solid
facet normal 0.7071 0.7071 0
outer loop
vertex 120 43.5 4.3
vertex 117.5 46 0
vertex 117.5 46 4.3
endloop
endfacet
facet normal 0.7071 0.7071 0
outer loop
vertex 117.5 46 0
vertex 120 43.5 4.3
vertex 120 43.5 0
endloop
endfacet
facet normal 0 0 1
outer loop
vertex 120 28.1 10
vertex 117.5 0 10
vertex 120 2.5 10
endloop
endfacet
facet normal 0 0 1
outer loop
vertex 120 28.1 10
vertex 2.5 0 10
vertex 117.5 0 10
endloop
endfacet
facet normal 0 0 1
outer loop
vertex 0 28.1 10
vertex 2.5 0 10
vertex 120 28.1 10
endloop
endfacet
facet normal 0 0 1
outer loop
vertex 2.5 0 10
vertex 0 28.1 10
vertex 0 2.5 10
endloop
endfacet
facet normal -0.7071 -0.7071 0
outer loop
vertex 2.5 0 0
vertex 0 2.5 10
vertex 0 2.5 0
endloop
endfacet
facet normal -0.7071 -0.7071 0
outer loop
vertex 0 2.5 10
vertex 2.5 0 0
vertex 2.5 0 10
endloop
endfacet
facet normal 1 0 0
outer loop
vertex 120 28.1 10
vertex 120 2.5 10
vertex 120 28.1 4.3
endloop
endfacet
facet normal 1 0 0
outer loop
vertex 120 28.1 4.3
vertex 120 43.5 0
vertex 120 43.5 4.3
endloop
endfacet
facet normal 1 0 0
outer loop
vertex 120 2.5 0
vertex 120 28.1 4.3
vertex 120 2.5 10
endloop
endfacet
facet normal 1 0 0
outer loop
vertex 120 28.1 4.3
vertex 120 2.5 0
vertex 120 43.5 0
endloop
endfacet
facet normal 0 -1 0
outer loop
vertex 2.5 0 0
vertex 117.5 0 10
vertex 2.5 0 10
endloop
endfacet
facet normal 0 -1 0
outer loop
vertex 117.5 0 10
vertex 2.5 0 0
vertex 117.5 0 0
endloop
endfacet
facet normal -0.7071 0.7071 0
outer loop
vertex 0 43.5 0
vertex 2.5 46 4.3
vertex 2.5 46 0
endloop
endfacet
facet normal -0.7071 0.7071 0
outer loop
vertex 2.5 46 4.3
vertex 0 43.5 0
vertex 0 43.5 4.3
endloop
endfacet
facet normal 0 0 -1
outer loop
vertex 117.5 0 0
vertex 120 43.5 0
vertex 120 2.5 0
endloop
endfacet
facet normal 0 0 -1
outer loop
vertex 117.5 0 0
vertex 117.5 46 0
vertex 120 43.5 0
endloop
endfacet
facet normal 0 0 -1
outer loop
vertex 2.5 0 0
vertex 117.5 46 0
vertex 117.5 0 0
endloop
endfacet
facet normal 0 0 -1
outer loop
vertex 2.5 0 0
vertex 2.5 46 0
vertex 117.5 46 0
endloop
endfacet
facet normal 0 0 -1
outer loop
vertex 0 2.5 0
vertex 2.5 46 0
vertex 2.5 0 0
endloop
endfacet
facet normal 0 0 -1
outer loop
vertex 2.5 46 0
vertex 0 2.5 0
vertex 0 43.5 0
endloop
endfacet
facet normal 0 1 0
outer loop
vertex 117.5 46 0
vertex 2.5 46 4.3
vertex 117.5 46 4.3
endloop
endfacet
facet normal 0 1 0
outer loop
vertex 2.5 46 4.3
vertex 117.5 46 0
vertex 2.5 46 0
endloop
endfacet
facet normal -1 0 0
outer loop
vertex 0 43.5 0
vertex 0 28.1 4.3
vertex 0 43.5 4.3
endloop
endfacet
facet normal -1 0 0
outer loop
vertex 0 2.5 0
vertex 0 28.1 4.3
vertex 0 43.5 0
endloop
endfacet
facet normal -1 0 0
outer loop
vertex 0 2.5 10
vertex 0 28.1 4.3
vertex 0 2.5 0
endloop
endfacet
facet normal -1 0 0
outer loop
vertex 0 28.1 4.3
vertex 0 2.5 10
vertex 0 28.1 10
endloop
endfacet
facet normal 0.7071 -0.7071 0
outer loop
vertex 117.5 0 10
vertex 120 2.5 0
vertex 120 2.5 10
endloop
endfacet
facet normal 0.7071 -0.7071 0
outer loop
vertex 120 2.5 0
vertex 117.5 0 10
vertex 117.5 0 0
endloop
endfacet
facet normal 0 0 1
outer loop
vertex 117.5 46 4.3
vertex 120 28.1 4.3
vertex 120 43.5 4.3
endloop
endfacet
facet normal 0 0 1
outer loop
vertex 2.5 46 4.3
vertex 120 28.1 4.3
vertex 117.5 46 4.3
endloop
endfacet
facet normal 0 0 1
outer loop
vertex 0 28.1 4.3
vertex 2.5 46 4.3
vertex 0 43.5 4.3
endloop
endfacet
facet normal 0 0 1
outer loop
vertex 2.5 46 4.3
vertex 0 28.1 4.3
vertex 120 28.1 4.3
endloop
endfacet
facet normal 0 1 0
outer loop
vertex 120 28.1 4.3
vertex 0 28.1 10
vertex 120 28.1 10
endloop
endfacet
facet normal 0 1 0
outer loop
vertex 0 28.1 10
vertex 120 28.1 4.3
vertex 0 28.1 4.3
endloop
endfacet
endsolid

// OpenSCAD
$fn = 32;

// ----------------------------------------------------------------------
// Stepped bar: sidestep, 120 x 46 x 10/4.3 mm
// ----------------------------------------------------------------------

// --- parameters (mm) ---
bar_l = 120;              // bar length, X
bar_w = 46;               // bar width, Y
plate_t = 10;             // thickness of the thick zone, Z
thin_t = 4.3;             // thickness of the thin zone
corner_c = 2.5;           // corner chamfer of the bar
step_cut = 5.7;           // material removed from the thin zone
ledge_y = 28.1;           // start of the ledge from the front edge
depth_1 = 5.7;            // depth of cut 1 from the top face
fit_tol = 0.1;            // declared fit tolerance (prompt contract)
free_tol = 0.5;           // declared free tolerance (prompt contract)

profile = [[2.5, 0], [117.5, 0], [120, 2.5], [120, 43.5], [117.5, 46], [2.5, 46], [0, 43.5], [0, 2.5]];  // primary outline, 8 points, counter clockwise
void_1 = [[-1, 28.1], [121, 28.1], [121, 47], [-1, 47]];  // ledge cut along one edge, 4 points

// --- the one profile operation ---
difference() {
  linear_extrude(height = plate_t) polygon(points = profile);
  translate([0, 0, plate_t - depth_1])
    linear_extrude(height = depth_1 + 1) polygon(points = void_1);
}
